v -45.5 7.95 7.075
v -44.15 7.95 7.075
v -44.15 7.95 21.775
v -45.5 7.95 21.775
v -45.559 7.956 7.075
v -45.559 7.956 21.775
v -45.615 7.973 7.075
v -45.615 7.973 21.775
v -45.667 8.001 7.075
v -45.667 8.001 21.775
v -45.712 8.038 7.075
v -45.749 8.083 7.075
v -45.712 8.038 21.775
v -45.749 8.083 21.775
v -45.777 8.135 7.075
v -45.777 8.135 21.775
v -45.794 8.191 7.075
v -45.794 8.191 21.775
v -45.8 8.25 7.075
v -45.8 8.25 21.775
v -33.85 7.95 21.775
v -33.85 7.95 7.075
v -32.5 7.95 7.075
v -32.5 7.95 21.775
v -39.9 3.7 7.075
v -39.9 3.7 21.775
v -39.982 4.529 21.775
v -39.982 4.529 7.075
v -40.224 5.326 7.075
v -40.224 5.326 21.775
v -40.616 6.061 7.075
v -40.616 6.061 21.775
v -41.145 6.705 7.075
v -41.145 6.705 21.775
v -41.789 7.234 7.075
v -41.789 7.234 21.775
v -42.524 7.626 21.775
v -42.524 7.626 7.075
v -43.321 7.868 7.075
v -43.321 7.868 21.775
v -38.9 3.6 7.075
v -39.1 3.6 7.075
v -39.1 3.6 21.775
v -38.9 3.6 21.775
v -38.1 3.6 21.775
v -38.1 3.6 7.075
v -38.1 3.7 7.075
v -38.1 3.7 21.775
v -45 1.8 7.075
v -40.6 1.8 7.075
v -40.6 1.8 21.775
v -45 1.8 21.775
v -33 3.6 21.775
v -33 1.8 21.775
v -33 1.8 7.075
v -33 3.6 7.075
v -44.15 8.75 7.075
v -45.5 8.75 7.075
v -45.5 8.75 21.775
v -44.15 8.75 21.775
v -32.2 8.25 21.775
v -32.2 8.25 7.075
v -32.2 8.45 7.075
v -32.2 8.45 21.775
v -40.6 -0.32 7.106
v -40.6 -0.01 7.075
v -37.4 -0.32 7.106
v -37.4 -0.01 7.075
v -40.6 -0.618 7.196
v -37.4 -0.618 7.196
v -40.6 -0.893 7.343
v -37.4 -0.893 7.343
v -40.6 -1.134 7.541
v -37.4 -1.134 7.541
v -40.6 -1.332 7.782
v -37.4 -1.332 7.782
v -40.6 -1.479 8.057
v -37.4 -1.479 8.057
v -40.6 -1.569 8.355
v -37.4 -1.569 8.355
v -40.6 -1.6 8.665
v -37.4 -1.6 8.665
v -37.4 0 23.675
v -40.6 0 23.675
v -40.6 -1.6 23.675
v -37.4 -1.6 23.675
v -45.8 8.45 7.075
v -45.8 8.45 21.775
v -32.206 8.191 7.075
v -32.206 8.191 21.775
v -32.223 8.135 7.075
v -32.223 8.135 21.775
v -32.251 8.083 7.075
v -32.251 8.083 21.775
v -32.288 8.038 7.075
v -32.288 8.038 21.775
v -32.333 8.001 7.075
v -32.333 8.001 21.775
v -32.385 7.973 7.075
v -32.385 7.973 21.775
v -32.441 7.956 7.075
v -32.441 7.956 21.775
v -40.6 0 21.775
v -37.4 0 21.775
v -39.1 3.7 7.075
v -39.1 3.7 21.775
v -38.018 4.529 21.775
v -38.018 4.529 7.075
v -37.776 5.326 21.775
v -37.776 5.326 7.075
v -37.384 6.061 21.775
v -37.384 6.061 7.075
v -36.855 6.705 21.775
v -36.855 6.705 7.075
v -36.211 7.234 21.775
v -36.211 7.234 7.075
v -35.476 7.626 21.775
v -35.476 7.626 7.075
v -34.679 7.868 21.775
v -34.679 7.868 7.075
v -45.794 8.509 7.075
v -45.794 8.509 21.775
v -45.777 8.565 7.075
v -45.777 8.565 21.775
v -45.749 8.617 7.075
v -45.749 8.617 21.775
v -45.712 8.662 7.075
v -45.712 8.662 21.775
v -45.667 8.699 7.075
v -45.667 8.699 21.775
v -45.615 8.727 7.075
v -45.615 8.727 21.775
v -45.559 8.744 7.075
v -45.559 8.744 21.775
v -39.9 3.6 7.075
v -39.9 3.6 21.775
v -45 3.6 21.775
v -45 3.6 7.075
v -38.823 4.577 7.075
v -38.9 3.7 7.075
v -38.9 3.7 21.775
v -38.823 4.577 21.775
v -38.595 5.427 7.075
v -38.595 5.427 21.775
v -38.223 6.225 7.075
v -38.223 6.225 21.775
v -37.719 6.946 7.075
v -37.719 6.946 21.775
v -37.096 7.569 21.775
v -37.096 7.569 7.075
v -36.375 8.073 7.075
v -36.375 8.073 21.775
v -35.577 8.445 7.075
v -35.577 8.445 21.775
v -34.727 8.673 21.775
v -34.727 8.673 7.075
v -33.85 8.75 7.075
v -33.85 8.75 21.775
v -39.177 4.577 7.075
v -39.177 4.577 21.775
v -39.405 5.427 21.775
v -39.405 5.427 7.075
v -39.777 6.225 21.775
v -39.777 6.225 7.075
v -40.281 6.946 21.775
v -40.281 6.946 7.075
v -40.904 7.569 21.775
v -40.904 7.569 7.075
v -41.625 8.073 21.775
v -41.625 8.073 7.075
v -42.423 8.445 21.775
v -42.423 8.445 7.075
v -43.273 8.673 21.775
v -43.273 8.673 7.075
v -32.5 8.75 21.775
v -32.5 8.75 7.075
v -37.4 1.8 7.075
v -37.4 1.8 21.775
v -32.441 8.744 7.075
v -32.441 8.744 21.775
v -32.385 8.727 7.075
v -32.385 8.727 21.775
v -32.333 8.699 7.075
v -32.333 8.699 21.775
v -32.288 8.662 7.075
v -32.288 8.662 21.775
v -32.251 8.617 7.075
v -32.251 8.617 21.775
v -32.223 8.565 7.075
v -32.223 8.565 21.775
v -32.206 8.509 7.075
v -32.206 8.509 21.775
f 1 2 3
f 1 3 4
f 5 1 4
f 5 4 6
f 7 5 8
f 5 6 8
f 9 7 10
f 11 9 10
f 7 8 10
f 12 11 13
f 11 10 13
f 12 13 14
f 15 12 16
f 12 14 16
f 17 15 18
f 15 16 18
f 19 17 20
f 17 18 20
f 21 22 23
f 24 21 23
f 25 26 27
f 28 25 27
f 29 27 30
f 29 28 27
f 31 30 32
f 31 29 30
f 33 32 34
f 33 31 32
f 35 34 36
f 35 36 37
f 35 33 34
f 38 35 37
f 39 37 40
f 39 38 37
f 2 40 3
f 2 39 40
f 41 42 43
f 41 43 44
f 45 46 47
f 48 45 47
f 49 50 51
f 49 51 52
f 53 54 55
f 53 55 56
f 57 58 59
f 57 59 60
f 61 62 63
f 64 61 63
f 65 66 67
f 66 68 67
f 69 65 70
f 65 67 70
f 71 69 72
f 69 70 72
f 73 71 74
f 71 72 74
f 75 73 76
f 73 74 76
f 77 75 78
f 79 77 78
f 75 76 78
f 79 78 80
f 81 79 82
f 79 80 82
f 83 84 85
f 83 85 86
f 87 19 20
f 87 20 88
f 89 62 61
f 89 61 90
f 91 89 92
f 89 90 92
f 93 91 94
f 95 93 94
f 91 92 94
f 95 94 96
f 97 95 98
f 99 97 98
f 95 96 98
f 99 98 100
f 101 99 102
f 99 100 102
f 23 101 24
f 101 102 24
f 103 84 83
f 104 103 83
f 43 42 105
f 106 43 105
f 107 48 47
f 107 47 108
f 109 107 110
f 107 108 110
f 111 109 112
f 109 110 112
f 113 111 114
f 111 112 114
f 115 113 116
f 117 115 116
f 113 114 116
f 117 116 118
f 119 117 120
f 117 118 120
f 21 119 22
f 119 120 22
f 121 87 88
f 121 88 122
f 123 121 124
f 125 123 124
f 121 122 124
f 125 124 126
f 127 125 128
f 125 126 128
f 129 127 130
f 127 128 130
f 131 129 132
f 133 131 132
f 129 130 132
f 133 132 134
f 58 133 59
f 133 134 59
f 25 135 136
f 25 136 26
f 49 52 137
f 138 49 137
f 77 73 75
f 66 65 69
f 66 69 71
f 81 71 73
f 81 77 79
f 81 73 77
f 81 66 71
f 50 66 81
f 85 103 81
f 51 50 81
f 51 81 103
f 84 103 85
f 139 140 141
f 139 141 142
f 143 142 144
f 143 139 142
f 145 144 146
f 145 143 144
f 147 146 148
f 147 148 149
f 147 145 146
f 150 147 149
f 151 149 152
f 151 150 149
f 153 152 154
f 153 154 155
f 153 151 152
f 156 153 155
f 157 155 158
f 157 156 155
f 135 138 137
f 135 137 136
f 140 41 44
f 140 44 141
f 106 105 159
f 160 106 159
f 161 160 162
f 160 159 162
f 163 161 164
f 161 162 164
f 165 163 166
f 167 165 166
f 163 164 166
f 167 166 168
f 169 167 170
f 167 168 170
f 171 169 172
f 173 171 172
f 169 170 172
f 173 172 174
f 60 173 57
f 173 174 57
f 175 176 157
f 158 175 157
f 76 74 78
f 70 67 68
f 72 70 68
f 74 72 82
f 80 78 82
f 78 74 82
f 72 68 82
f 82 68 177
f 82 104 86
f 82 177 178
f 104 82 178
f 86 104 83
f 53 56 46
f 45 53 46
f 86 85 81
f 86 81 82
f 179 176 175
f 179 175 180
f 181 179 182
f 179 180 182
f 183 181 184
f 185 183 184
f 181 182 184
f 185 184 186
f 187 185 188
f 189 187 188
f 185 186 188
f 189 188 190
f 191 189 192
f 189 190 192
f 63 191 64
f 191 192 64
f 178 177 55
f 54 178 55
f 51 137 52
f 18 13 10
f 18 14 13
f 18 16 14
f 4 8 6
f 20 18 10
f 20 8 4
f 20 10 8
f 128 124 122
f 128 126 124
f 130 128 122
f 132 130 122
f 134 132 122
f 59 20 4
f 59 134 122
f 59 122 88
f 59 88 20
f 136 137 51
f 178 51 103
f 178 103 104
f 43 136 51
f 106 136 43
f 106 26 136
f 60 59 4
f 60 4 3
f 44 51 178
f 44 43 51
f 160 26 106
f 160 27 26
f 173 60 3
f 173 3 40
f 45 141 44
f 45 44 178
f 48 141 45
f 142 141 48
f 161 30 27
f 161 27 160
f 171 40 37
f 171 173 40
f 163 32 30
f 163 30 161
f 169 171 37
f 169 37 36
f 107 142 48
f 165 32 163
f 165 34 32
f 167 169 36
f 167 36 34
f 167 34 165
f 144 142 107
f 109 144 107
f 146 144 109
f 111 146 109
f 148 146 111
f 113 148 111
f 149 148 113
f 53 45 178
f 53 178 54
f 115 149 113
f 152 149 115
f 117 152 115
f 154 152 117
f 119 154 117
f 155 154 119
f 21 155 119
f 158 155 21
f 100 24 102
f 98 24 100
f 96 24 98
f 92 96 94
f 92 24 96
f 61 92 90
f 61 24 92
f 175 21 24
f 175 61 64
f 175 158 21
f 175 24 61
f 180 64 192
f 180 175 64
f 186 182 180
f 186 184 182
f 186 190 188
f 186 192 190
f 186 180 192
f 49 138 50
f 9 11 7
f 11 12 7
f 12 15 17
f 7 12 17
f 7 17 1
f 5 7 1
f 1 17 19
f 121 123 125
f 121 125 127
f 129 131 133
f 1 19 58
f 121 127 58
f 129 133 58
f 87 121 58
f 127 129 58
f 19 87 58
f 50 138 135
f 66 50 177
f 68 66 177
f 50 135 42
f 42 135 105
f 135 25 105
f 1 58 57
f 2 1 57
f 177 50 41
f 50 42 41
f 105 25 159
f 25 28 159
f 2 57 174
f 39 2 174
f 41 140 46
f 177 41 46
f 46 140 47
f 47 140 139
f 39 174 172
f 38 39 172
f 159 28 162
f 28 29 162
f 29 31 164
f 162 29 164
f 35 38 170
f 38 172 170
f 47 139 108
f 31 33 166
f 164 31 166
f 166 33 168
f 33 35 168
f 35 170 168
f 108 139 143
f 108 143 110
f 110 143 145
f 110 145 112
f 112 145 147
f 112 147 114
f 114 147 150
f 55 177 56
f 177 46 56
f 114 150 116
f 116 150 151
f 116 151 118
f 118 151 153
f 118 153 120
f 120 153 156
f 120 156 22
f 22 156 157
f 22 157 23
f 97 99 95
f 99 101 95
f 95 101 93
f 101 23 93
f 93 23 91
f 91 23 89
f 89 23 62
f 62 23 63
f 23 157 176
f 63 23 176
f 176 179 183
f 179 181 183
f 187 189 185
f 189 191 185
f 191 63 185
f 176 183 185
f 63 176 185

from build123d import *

# Parameters (mm, degrees)
PAD013_DEPTH = 14.7
FILLET007_R  = 0.3
BOX003_W     = 3.2
BOX003_H     = 16.6
BOX003_DEPTH = 1.6
FILLET011_R  = 1.59


with BuildPart() as part:
    # Sketch025 → Pad013 (new body)
    with BuildSketch(Plane.XY):
        with BuildLine():
            Line((-1.6, 0), (-6, 0))
            Line((-6, 0), (-6, 1.8))
            Line((-6, 1.8), (-0.9, 1.8))
            Line((-0.9, 1.8), (-0.9, 1.9))
            ThreePointArc((-0.9, 1.9), (-2.144796, 4.905204), (-5.15, 6.15))
            Line((-5.15, 6.15), (-6.8, 6.15))
            Line((-6.8, 6.15), (-6.8, 6.95))
            Line((-6.8, 6.95), (-5.15, 6.95))
            ThreePointArc((-0.1, 1.9), (-1.579111, 5.470889), (-5.15, 6.95))
            Line((-0.1, 1.8), (-0.1, 1.9))
            Line((0, 1.8), (-0.1, 1.8))
            Line((0, -1.8), (0, 1.8))
            Line((-1.6, -1.8), (0, -1.8))
            Line((-1.6, 0), (-1.6, -1.8))
        make_face()
    pad013 = extrude(amount=PAD013_DEPTH)

    # Mirrored005: Pad013 across Sketch025 V_Axis
    add(pad013.mirror(Plane(origin=(0, 0, 0), x_dir=(0, 0, 1), z_dir=(1, 0, 0))))

    # Fillet007
    fillet007_edges = [part.edges().sort_by_distance(p)[0] for p in [
        (6.8, 6.15, 7.35),
        (6.8, 6.95, 7.35),
        (-6.8, 6.95, 7.35),
        (-6.8, 6.15, 7.35),
    ]]
    fillet(fillet007_edges, radius=FILLET007_R)

    # Box003 → Box003 (join)
    with BuildSketch(Plane(origin=(-1.6, -1.8, 0), x_dir=(1, 0, 0), z_dir=(0, -1, 0))):
        with Locations((1.6, 8.3)):
            Rectangle(BOX003_W, BOX003_H)
    extrude(amount=BOX003_DEPTH)

    # Fillet011
    fillet011_edges = [part.edges().sort_by_distance(p)[0] for p in [
        (0, -3.4, 0),
    ]]
    fillet(fillet011_edges, radius=FILLET011_R)


with BuildPart() as part_1:
    # Body002 placement: moved
    add(part.part.moved(Location((-39, 1.8, 7.075))))


solid = part_1.part
